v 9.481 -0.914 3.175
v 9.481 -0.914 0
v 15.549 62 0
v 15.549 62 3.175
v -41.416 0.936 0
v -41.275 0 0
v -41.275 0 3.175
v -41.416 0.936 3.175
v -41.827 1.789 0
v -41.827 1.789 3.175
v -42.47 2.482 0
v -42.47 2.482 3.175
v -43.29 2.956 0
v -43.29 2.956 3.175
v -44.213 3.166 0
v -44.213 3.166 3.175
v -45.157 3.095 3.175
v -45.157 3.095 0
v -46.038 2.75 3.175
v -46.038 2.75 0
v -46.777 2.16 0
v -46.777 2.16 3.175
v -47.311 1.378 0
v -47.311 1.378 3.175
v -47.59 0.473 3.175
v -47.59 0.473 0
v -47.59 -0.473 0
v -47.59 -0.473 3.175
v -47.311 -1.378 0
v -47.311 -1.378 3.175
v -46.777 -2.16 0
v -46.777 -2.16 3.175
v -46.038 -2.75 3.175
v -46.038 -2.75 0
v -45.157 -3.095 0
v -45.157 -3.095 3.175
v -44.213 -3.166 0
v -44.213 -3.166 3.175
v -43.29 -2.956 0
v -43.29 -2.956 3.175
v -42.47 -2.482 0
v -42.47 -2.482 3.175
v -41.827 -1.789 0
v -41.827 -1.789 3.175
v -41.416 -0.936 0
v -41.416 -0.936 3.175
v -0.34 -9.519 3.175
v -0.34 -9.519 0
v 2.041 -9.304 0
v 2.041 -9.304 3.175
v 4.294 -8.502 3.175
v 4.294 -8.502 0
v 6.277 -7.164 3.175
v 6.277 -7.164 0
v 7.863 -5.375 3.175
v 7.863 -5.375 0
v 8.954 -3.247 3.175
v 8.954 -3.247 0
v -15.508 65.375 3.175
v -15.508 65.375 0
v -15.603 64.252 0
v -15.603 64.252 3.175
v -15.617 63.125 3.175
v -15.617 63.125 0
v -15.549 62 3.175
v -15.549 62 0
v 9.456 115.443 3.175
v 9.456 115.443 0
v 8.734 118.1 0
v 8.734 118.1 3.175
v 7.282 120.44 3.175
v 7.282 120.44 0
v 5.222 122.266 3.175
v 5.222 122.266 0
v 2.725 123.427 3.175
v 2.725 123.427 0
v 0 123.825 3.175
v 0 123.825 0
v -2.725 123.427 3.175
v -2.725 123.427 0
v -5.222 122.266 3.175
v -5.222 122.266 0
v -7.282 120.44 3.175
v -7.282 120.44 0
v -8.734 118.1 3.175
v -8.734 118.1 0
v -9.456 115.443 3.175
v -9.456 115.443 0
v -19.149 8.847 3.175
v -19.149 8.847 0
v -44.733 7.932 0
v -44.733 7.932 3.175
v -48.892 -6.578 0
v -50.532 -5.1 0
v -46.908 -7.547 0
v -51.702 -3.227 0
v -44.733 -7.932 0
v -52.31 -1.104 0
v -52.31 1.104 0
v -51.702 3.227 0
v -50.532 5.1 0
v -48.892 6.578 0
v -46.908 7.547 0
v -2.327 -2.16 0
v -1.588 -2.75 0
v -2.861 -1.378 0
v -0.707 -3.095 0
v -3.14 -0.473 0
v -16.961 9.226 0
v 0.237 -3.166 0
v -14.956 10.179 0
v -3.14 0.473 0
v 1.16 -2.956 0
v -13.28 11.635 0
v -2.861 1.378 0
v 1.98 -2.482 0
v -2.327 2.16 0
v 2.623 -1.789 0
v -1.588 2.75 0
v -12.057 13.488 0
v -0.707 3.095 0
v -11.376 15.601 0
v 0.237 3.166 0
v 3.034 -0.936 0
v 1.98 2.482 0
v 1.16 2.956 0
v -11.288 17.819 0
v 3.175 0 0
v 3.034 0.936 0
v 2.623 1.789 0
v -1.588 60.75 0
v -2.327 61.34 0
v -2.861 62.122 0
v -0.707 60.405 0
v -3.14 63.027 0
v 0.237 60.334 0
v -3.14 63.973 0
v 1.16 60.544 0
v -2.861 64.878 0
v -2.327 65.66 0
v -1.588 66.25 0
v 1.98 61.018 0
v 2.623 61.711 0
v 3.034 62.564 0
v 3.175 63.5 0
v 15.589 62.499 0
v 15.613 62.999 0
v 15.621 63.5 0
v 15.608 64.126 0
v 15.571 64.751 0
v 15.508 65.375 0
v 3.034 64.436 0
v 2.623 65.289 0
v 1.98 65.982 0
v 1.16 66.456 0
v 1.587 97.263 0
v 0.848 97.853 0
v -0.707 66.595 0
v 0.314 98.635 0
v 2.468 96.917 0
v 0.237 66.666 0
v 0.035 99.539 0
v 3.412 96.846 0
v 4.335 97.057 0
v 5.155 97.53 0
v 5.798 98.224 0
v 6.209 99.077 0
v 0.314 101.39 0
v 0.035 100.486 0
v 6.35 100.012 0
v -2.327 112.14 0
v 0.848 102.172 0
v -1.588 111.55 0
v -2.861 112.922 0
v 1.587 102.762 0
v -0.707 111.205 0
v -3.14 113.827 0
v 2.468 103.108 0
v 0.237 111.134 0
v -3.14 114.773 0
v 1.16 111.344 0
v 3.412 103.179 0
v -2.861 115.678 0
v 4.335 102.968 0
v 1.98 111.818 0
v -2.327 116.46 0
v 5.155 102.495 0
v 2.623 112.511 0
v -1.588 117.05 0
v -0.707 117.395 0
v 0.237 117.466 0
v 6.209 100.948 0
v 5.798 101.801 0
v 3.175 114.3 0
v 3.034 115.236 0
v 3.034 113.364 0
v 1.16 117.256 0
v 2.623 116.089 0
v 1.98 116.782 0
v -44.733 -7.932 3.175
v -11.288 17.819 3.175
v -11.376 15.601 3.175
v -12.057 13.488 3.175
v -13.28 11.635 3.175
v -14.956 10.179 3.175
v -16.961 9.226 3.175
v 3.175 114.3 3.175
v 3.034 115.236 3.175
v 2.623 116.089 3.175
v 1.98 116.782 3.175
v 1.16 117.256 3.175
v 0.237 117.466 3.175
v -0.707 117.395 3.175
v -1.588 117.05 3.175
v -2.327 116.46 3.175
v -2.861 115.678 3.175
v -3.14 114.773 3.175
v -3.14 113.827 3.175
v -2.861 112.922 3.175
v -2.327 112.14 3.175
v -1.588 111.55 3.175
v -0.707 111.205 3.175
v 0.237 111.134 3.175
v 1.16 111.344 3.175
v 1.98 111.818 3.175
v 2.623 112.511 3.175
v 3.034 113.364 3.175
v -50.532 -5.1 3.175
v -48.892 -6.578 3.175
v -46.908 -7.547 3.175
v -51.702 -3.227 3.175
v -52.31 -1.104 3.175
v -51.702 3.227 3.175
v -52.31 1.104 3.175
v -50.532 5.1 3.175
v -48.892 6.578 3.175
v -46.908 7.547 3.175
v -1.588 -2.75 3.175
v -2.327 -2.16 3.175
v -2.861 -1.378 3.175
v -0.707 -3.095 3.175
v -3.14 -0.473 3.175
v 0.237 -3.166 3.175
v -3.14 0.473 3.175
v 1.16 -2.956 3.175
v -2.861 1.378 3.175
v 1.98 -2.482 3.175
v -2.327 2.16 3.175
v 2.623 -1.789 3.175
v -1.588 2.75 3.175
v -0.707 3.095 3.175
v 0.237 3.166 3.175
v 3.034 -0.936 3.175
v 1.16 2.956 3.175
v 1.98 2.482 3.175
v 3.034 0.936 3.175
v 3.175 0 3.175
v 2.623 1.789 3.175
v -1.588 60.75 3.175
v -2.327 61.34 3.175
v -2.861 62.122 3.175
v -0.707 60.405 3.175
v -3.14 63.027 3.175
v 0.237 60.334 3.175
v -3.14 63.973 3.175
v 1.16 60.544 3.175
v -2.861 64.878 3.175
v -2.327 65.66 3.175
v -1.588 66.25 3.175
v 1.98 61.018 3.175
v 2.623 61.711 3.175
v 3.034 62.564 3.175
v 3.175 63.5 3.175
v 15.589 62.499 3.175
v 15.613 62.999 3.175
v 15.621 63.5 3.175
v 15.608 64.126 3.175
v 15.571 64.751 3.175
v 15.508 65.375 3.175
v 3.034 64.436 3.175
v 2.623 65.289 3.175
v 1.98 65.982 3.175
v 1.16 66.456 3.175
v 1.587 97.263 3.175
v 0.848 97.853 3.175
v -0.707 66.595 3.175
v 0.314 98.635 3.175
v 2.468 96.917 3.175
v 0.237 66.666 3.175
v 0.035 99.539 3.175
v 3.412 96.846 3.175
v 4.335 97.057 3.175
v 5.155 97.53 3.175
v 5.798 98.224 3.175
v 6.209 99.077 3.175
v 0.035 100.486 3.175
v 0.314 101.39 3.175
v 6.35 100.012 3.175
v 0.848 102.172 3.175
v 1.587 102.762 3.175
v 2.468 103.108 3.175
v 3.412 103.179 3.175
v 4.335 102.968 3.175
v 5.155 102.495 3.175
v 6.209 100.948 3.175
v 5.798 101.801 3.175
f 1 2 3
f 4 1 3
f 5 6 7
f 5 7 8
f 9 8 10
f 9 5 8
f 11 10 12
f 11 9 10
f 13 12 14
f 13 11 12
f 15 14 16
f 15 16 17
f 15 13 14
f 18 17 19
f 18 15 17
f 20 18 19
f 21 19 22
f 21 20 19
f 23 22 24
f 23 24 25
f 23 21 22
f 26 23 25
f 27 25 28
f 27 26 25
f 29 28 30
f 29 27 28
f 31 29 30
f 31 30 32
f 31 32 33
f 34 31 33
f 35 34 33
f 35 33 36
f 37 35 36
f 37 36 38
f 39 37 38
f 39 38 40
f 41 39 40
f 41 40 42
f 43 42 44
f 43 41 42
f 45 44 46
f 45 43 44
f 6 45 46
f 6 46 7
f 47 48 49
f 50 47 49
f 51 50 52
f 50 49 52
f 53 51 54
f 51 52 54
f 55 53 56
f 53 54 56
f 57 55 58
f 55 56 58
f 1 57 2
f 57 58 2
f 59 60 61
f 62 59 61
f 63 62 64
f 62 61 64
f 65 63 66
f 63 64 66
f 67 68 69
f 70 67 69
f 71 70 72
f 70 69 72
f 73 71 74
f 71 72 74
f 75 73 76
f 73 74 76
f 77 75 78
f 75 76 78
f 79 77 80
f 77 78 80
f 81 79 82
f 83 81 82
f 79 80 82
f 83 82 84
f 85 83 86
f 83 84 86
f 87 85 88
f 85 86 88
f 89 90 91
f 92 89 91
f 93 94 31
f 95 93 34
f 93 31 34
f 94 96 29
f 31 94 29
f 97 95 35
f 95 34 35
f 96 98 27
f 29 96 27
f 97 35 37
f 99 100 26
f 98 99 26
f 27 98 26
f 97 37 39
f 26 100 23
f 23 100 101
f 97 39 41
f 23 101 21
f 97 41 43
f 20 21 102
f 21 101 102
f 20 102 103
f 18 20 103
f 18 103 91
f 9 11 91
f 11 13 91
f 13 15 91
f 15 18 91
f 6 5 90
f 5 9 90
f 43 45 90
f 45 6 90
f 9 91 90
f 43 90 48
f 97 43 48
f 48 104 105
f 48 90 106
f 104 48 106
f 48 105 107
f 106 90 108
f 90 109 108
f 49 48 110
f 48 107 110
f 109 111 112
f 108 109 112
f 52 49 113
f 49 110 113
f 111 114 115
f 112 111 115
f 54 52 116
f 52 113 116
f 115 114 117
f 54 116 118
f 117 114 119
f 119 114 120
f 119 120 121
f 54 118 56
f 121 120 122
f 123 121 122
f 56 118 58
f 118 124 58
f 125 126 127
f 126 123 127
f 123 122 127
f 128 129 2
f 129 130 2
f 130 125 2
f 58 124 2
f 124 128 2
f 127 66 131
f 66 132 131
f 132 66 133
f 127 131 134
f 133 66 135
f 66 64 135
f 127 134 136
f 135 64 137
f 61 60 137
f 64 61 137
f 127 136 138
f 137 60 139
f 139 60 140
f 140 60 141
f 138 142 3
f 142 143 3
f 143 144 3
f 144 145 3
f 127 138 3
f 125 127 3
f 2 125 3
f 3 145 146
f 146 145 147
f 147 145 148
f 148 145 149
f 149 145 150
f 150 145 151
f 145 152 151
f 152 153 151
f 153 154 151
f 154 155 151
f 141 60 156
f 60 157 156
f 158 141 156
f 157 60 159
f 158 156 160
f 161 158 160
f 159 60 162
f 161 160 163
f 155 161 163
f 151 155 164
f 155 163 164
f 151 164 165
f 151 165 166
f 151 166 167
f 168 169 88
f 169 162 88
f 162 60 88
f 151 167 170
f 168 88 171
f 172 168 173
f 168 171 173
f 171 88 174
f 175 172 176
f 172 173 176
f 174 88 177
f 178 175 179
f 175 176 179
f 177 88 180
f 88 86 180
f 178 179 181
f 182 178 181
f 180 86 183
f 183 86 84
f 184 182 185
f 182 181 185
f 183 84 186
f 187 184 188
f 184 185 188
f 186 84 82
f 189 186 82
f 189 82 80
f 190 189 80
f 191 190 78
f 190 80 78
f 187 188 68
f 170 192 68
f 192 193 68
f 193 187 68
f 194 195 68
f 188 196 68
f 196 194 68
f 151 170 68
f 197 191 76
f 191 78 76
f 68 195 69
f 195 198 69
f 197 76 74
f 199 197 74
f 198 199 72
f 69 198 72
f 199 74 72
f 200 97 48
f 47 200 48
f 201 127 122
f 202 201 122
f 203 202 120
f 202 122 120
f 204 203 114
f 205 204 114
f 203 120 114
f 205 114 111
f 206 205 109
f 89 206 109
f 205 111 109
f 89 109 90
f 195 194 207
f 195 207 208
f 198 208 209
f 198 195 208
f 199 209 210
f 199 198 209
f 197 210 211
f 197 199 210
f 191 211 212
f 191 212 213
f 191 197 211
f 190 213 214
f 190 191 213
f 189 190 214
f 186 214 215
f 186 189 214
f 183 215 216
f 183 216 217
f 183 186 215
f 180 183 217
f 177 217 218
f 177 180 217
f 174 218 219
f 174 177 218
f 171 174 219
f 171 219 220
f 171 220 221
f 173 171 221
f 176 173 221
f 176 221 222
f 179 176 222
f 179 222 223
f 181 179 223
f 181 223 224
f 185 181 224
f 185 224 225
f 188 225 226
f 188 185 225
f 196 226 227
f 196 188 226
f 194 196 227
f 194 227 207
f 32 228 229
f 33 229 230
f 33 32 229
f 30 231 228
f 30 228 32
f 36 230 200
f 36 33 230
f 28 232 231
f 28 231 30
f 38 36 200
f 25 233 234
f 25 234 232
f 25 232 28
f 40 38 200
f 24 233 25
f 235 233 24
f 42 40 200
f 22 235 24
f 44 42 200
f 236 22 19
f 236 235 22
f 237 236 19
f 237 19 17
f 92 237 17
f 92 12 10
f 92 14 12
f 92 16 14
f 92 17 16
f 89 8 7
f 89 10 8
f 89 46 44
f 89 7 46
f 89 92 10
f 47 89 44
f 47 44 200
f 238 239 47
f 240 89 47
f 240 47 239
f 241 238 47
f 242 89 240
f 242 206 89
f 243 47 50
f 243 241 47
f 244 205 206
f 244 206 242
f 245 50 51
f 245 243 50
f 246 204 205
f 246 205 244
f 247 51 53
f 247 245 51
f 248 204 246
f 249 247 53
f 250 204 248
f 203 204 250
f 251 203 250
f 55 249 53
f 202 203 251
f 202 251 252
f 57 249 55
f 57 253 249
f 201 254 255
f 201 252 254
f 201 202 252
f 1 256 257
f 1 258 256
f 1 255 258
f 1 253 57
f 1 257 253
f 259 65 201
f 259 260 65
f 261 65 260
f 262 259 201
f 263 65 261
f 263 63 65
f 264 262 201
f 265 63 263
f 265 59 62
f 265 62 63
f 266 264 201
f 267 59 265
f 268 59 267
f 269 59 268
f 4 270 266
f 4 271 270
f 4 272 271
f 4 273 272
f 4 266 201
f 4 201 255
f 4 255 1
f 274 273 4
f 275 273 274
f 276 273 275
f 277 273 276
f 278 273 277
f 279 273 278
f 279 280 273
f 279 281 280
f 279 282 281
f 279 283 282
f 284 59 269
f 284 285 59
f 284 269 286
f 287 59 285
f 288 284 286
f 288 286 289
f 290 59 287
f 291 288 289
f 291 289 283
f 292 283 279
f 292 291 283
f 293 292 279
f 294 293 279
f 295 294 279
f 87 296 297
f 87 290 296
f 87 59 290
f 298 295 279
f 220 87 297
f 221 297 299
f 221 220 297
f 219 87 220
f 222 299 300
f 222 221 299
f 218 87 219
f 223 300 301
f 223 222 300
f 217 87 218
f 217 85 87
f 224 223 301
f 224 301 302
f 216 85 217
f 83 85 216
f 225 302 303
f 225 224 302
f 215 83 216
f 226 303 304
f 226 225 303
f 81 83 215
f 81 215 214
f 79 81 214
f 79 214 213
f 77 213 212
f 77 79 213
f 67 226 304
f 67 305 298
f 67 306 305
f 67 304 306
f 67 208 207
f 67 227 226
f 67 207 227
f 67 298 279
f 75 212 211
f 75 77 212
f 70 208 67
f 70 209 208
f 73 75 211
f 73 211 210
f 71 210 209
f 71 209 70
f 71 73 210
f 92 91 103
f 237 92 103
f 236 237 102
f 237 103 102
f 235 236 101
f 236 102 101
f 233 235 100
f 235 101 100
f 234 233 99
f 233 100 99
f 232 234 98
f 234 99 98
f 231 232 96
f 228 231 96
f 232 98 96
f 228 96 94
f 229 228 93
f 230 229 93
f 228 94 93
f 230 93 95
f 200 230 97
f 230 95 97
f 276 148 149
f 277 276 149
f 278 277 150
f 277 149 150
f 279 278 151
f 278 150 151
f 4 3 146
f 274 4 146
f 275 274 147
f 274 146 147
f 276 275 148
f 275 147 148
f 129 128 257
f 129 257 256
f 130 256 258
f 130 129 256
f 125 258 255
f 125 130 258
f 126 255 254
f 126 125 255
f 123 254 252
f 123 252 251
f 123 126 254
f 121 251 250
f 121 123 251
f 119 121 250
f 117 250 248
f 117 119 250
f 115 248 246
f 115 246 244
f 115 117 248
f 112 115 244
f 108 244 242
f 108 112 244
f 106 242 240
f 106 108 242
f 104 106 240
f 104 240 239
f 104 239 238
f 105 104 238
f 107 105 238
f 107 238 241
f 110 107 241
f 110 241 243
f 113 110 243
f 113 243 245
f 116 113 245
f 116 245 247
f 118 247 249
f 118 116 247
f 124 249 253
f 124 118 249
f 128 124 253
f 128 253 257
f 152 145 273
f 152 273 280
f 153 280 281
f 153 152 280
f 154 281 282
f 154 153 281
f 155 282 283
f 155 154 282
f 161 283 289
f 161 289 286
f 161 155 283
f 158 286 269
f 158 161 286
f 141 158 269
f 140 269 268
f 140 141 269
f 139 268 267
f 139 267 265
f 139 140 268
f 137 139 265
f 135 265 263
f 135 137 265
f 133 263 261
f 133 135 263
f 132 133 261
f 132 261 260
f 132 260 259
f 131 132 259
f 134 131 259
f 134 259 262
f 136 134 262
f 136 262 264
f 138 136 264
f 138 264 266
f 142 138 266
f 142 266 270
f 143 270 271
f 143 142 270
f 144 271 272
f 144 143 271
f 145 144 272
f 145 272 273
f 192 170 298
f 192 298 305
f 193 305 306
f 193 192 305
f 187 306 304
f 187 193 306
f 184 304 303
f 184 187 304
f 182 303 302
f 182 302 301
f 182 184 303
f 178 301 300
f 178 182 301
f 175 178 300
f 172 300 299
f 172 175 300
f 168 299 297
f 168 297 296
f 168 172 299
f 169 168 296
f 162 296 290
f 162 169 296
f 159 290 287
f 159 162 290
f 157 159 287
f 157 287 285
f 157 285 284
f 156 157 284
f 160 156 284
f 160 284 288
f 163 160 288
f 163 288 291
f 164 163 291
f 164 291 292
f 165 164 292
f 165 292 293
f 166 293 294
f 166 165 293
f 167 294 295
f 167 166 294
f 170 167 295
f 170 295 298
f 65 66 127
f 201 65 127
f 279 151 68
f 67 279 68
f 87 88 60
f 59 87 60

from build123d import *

# Parameters (mm, degrees)
F0_R     = 3.175
F1_DEPTH = 3.175


with BuildPart() as f1:
    # F0 (on Top) → F1 (new body)
    with BuildSketch(Plane.XY):
        with BuildLine():
            ThreePointArc((9.481007, -0.9144), (9.513995, -0.457729), (9.525, 0))
            ThreePointArc((9.525, 0), (6.613827, 6.854408), (-0.340179, 9.518923))
            ThreePointArc((-0.340179, 9.518923), (-9.525, 0), (-0.340179, -9.518923))
            ThreePointArc((-0.340179, -9.518923), (6.276794, -7.16432), (9.481007, -0.9144))
        make_face()
        Circle(F0_R, mode=Mode.SUBTRACT)
        with BuildLine():
            ThreePointArc((-0.340179, 9.518923), (6.613827, 6.854408), (9.525, 0))
            ThreePointArc((9.525, 0), (9.513995, -0.457729), (9.481007, -0.9144))
            Line((9.481007, -0.9144), (15.548852, 62.000384))
            ThreePointArc((15.548852, 62.000384), (0, 47.879), (-15.548852, 62.000384))
            Line((-15.548852, 62.000384), (-11.287798, 17.819412))
            ThreePointArc((-11.287798, 17.819412), (-13.280149, 11.634986), (-19.148911, 8.846754))
            Line((-19.148911, 8.846754), (-44.733482, 7.932436))
            ThreePointArc((-44.733482, 7.932436), (-38.938477, 5.712007), (-36.5125, 0))
            ThreePointArc((-36.5125, 0), (-38.938477, -5.712007), (-44.733482, -7.932436))
            Line((-44.733482, -7.932436), (-0.340179, -9.518923))
            ThreePointArc((-0.340179, -9.518923), (-9.525, 0), (-0.340179, 9.518923))
        make_face()
        with BuildLine():
            ThreePointArc((-15.548852, 62.000384), (0, 47.879), (15.548852, 62.000384))
            ThreePointArc((15.548852, 62.000384), (15.602953, 62.749325), (15.621, 63.5))
            ThreePointArc((15.621, 63.5), (15.592755, 64.438958), (15.508121, 65.37452))
            ThreePointArc((15.508121, 65.37452), (0, 79.121), (-15.508121, 65.37452))
            ThreePointArc((-15.508121, 65.37452), (-15.619862, 63.688555), (-15.548852, 62.000384))
        make_face()
        with Locations((0, 63.5)):
            Circle(F0_R, mode=Mode.SUBTRACT)
        with BuildLine():
            ThreePointArc((-44.733482, 7.932436), (-52.3875, 0), (-44.733482, -7.932436))
            ThreePointArc((-44.733482, -7.932436), (-38.938477, -5.712007), (-36.5125, 0))
            ThreePointArc((-36.5125, 0), (-38.938477, 5.712007), (-44.733482, 7.932436))
        make_face()
        with Locations((-44.45, 0)):
            Circle(F0_R, mode=Mode.SUBTRACT)
        with BuildLine():
            ThreePointArc((-15.508121, 65.37452), (0, 79.121), (15.508121, 65.37452))
            Line((15.508121, 65.37452), (9.456171, 115.443))
            ThreePointArc((9.456171, 115.443), (9.507777, 114.872535), (9.525, 114.3))
            ThreePointArc((9.525, 114.3), (-0.572535, 104.792223), (-9.456171, 115.443))
            Line((-9.456171, 115.443), (-15.508121, 65.37452))
        make_face()
        with Locations((3.175, 100.0125)):
            Circle(F0_R, mode=Mode.SUBTRACT)
        with BuildLine():
            ThreePointArc((9.525, 114.3), (9.507777, 114.872535), (9.456171, 115.443))
            ThreePointArc((9.456171, 115.443), (0, 123.825), (-9.456171, 115.443))
            ThreePointArc((-9.456171, 115.443), (-0.572535, 104.792223), (9.525, 114.3))
        make_face()
        with Locations((0, 114.3)):
            Circle(F0_R, mode=Mode.SUBTRACT)
    extrude(amount=F1_DEPTH)


solid = f1.part
